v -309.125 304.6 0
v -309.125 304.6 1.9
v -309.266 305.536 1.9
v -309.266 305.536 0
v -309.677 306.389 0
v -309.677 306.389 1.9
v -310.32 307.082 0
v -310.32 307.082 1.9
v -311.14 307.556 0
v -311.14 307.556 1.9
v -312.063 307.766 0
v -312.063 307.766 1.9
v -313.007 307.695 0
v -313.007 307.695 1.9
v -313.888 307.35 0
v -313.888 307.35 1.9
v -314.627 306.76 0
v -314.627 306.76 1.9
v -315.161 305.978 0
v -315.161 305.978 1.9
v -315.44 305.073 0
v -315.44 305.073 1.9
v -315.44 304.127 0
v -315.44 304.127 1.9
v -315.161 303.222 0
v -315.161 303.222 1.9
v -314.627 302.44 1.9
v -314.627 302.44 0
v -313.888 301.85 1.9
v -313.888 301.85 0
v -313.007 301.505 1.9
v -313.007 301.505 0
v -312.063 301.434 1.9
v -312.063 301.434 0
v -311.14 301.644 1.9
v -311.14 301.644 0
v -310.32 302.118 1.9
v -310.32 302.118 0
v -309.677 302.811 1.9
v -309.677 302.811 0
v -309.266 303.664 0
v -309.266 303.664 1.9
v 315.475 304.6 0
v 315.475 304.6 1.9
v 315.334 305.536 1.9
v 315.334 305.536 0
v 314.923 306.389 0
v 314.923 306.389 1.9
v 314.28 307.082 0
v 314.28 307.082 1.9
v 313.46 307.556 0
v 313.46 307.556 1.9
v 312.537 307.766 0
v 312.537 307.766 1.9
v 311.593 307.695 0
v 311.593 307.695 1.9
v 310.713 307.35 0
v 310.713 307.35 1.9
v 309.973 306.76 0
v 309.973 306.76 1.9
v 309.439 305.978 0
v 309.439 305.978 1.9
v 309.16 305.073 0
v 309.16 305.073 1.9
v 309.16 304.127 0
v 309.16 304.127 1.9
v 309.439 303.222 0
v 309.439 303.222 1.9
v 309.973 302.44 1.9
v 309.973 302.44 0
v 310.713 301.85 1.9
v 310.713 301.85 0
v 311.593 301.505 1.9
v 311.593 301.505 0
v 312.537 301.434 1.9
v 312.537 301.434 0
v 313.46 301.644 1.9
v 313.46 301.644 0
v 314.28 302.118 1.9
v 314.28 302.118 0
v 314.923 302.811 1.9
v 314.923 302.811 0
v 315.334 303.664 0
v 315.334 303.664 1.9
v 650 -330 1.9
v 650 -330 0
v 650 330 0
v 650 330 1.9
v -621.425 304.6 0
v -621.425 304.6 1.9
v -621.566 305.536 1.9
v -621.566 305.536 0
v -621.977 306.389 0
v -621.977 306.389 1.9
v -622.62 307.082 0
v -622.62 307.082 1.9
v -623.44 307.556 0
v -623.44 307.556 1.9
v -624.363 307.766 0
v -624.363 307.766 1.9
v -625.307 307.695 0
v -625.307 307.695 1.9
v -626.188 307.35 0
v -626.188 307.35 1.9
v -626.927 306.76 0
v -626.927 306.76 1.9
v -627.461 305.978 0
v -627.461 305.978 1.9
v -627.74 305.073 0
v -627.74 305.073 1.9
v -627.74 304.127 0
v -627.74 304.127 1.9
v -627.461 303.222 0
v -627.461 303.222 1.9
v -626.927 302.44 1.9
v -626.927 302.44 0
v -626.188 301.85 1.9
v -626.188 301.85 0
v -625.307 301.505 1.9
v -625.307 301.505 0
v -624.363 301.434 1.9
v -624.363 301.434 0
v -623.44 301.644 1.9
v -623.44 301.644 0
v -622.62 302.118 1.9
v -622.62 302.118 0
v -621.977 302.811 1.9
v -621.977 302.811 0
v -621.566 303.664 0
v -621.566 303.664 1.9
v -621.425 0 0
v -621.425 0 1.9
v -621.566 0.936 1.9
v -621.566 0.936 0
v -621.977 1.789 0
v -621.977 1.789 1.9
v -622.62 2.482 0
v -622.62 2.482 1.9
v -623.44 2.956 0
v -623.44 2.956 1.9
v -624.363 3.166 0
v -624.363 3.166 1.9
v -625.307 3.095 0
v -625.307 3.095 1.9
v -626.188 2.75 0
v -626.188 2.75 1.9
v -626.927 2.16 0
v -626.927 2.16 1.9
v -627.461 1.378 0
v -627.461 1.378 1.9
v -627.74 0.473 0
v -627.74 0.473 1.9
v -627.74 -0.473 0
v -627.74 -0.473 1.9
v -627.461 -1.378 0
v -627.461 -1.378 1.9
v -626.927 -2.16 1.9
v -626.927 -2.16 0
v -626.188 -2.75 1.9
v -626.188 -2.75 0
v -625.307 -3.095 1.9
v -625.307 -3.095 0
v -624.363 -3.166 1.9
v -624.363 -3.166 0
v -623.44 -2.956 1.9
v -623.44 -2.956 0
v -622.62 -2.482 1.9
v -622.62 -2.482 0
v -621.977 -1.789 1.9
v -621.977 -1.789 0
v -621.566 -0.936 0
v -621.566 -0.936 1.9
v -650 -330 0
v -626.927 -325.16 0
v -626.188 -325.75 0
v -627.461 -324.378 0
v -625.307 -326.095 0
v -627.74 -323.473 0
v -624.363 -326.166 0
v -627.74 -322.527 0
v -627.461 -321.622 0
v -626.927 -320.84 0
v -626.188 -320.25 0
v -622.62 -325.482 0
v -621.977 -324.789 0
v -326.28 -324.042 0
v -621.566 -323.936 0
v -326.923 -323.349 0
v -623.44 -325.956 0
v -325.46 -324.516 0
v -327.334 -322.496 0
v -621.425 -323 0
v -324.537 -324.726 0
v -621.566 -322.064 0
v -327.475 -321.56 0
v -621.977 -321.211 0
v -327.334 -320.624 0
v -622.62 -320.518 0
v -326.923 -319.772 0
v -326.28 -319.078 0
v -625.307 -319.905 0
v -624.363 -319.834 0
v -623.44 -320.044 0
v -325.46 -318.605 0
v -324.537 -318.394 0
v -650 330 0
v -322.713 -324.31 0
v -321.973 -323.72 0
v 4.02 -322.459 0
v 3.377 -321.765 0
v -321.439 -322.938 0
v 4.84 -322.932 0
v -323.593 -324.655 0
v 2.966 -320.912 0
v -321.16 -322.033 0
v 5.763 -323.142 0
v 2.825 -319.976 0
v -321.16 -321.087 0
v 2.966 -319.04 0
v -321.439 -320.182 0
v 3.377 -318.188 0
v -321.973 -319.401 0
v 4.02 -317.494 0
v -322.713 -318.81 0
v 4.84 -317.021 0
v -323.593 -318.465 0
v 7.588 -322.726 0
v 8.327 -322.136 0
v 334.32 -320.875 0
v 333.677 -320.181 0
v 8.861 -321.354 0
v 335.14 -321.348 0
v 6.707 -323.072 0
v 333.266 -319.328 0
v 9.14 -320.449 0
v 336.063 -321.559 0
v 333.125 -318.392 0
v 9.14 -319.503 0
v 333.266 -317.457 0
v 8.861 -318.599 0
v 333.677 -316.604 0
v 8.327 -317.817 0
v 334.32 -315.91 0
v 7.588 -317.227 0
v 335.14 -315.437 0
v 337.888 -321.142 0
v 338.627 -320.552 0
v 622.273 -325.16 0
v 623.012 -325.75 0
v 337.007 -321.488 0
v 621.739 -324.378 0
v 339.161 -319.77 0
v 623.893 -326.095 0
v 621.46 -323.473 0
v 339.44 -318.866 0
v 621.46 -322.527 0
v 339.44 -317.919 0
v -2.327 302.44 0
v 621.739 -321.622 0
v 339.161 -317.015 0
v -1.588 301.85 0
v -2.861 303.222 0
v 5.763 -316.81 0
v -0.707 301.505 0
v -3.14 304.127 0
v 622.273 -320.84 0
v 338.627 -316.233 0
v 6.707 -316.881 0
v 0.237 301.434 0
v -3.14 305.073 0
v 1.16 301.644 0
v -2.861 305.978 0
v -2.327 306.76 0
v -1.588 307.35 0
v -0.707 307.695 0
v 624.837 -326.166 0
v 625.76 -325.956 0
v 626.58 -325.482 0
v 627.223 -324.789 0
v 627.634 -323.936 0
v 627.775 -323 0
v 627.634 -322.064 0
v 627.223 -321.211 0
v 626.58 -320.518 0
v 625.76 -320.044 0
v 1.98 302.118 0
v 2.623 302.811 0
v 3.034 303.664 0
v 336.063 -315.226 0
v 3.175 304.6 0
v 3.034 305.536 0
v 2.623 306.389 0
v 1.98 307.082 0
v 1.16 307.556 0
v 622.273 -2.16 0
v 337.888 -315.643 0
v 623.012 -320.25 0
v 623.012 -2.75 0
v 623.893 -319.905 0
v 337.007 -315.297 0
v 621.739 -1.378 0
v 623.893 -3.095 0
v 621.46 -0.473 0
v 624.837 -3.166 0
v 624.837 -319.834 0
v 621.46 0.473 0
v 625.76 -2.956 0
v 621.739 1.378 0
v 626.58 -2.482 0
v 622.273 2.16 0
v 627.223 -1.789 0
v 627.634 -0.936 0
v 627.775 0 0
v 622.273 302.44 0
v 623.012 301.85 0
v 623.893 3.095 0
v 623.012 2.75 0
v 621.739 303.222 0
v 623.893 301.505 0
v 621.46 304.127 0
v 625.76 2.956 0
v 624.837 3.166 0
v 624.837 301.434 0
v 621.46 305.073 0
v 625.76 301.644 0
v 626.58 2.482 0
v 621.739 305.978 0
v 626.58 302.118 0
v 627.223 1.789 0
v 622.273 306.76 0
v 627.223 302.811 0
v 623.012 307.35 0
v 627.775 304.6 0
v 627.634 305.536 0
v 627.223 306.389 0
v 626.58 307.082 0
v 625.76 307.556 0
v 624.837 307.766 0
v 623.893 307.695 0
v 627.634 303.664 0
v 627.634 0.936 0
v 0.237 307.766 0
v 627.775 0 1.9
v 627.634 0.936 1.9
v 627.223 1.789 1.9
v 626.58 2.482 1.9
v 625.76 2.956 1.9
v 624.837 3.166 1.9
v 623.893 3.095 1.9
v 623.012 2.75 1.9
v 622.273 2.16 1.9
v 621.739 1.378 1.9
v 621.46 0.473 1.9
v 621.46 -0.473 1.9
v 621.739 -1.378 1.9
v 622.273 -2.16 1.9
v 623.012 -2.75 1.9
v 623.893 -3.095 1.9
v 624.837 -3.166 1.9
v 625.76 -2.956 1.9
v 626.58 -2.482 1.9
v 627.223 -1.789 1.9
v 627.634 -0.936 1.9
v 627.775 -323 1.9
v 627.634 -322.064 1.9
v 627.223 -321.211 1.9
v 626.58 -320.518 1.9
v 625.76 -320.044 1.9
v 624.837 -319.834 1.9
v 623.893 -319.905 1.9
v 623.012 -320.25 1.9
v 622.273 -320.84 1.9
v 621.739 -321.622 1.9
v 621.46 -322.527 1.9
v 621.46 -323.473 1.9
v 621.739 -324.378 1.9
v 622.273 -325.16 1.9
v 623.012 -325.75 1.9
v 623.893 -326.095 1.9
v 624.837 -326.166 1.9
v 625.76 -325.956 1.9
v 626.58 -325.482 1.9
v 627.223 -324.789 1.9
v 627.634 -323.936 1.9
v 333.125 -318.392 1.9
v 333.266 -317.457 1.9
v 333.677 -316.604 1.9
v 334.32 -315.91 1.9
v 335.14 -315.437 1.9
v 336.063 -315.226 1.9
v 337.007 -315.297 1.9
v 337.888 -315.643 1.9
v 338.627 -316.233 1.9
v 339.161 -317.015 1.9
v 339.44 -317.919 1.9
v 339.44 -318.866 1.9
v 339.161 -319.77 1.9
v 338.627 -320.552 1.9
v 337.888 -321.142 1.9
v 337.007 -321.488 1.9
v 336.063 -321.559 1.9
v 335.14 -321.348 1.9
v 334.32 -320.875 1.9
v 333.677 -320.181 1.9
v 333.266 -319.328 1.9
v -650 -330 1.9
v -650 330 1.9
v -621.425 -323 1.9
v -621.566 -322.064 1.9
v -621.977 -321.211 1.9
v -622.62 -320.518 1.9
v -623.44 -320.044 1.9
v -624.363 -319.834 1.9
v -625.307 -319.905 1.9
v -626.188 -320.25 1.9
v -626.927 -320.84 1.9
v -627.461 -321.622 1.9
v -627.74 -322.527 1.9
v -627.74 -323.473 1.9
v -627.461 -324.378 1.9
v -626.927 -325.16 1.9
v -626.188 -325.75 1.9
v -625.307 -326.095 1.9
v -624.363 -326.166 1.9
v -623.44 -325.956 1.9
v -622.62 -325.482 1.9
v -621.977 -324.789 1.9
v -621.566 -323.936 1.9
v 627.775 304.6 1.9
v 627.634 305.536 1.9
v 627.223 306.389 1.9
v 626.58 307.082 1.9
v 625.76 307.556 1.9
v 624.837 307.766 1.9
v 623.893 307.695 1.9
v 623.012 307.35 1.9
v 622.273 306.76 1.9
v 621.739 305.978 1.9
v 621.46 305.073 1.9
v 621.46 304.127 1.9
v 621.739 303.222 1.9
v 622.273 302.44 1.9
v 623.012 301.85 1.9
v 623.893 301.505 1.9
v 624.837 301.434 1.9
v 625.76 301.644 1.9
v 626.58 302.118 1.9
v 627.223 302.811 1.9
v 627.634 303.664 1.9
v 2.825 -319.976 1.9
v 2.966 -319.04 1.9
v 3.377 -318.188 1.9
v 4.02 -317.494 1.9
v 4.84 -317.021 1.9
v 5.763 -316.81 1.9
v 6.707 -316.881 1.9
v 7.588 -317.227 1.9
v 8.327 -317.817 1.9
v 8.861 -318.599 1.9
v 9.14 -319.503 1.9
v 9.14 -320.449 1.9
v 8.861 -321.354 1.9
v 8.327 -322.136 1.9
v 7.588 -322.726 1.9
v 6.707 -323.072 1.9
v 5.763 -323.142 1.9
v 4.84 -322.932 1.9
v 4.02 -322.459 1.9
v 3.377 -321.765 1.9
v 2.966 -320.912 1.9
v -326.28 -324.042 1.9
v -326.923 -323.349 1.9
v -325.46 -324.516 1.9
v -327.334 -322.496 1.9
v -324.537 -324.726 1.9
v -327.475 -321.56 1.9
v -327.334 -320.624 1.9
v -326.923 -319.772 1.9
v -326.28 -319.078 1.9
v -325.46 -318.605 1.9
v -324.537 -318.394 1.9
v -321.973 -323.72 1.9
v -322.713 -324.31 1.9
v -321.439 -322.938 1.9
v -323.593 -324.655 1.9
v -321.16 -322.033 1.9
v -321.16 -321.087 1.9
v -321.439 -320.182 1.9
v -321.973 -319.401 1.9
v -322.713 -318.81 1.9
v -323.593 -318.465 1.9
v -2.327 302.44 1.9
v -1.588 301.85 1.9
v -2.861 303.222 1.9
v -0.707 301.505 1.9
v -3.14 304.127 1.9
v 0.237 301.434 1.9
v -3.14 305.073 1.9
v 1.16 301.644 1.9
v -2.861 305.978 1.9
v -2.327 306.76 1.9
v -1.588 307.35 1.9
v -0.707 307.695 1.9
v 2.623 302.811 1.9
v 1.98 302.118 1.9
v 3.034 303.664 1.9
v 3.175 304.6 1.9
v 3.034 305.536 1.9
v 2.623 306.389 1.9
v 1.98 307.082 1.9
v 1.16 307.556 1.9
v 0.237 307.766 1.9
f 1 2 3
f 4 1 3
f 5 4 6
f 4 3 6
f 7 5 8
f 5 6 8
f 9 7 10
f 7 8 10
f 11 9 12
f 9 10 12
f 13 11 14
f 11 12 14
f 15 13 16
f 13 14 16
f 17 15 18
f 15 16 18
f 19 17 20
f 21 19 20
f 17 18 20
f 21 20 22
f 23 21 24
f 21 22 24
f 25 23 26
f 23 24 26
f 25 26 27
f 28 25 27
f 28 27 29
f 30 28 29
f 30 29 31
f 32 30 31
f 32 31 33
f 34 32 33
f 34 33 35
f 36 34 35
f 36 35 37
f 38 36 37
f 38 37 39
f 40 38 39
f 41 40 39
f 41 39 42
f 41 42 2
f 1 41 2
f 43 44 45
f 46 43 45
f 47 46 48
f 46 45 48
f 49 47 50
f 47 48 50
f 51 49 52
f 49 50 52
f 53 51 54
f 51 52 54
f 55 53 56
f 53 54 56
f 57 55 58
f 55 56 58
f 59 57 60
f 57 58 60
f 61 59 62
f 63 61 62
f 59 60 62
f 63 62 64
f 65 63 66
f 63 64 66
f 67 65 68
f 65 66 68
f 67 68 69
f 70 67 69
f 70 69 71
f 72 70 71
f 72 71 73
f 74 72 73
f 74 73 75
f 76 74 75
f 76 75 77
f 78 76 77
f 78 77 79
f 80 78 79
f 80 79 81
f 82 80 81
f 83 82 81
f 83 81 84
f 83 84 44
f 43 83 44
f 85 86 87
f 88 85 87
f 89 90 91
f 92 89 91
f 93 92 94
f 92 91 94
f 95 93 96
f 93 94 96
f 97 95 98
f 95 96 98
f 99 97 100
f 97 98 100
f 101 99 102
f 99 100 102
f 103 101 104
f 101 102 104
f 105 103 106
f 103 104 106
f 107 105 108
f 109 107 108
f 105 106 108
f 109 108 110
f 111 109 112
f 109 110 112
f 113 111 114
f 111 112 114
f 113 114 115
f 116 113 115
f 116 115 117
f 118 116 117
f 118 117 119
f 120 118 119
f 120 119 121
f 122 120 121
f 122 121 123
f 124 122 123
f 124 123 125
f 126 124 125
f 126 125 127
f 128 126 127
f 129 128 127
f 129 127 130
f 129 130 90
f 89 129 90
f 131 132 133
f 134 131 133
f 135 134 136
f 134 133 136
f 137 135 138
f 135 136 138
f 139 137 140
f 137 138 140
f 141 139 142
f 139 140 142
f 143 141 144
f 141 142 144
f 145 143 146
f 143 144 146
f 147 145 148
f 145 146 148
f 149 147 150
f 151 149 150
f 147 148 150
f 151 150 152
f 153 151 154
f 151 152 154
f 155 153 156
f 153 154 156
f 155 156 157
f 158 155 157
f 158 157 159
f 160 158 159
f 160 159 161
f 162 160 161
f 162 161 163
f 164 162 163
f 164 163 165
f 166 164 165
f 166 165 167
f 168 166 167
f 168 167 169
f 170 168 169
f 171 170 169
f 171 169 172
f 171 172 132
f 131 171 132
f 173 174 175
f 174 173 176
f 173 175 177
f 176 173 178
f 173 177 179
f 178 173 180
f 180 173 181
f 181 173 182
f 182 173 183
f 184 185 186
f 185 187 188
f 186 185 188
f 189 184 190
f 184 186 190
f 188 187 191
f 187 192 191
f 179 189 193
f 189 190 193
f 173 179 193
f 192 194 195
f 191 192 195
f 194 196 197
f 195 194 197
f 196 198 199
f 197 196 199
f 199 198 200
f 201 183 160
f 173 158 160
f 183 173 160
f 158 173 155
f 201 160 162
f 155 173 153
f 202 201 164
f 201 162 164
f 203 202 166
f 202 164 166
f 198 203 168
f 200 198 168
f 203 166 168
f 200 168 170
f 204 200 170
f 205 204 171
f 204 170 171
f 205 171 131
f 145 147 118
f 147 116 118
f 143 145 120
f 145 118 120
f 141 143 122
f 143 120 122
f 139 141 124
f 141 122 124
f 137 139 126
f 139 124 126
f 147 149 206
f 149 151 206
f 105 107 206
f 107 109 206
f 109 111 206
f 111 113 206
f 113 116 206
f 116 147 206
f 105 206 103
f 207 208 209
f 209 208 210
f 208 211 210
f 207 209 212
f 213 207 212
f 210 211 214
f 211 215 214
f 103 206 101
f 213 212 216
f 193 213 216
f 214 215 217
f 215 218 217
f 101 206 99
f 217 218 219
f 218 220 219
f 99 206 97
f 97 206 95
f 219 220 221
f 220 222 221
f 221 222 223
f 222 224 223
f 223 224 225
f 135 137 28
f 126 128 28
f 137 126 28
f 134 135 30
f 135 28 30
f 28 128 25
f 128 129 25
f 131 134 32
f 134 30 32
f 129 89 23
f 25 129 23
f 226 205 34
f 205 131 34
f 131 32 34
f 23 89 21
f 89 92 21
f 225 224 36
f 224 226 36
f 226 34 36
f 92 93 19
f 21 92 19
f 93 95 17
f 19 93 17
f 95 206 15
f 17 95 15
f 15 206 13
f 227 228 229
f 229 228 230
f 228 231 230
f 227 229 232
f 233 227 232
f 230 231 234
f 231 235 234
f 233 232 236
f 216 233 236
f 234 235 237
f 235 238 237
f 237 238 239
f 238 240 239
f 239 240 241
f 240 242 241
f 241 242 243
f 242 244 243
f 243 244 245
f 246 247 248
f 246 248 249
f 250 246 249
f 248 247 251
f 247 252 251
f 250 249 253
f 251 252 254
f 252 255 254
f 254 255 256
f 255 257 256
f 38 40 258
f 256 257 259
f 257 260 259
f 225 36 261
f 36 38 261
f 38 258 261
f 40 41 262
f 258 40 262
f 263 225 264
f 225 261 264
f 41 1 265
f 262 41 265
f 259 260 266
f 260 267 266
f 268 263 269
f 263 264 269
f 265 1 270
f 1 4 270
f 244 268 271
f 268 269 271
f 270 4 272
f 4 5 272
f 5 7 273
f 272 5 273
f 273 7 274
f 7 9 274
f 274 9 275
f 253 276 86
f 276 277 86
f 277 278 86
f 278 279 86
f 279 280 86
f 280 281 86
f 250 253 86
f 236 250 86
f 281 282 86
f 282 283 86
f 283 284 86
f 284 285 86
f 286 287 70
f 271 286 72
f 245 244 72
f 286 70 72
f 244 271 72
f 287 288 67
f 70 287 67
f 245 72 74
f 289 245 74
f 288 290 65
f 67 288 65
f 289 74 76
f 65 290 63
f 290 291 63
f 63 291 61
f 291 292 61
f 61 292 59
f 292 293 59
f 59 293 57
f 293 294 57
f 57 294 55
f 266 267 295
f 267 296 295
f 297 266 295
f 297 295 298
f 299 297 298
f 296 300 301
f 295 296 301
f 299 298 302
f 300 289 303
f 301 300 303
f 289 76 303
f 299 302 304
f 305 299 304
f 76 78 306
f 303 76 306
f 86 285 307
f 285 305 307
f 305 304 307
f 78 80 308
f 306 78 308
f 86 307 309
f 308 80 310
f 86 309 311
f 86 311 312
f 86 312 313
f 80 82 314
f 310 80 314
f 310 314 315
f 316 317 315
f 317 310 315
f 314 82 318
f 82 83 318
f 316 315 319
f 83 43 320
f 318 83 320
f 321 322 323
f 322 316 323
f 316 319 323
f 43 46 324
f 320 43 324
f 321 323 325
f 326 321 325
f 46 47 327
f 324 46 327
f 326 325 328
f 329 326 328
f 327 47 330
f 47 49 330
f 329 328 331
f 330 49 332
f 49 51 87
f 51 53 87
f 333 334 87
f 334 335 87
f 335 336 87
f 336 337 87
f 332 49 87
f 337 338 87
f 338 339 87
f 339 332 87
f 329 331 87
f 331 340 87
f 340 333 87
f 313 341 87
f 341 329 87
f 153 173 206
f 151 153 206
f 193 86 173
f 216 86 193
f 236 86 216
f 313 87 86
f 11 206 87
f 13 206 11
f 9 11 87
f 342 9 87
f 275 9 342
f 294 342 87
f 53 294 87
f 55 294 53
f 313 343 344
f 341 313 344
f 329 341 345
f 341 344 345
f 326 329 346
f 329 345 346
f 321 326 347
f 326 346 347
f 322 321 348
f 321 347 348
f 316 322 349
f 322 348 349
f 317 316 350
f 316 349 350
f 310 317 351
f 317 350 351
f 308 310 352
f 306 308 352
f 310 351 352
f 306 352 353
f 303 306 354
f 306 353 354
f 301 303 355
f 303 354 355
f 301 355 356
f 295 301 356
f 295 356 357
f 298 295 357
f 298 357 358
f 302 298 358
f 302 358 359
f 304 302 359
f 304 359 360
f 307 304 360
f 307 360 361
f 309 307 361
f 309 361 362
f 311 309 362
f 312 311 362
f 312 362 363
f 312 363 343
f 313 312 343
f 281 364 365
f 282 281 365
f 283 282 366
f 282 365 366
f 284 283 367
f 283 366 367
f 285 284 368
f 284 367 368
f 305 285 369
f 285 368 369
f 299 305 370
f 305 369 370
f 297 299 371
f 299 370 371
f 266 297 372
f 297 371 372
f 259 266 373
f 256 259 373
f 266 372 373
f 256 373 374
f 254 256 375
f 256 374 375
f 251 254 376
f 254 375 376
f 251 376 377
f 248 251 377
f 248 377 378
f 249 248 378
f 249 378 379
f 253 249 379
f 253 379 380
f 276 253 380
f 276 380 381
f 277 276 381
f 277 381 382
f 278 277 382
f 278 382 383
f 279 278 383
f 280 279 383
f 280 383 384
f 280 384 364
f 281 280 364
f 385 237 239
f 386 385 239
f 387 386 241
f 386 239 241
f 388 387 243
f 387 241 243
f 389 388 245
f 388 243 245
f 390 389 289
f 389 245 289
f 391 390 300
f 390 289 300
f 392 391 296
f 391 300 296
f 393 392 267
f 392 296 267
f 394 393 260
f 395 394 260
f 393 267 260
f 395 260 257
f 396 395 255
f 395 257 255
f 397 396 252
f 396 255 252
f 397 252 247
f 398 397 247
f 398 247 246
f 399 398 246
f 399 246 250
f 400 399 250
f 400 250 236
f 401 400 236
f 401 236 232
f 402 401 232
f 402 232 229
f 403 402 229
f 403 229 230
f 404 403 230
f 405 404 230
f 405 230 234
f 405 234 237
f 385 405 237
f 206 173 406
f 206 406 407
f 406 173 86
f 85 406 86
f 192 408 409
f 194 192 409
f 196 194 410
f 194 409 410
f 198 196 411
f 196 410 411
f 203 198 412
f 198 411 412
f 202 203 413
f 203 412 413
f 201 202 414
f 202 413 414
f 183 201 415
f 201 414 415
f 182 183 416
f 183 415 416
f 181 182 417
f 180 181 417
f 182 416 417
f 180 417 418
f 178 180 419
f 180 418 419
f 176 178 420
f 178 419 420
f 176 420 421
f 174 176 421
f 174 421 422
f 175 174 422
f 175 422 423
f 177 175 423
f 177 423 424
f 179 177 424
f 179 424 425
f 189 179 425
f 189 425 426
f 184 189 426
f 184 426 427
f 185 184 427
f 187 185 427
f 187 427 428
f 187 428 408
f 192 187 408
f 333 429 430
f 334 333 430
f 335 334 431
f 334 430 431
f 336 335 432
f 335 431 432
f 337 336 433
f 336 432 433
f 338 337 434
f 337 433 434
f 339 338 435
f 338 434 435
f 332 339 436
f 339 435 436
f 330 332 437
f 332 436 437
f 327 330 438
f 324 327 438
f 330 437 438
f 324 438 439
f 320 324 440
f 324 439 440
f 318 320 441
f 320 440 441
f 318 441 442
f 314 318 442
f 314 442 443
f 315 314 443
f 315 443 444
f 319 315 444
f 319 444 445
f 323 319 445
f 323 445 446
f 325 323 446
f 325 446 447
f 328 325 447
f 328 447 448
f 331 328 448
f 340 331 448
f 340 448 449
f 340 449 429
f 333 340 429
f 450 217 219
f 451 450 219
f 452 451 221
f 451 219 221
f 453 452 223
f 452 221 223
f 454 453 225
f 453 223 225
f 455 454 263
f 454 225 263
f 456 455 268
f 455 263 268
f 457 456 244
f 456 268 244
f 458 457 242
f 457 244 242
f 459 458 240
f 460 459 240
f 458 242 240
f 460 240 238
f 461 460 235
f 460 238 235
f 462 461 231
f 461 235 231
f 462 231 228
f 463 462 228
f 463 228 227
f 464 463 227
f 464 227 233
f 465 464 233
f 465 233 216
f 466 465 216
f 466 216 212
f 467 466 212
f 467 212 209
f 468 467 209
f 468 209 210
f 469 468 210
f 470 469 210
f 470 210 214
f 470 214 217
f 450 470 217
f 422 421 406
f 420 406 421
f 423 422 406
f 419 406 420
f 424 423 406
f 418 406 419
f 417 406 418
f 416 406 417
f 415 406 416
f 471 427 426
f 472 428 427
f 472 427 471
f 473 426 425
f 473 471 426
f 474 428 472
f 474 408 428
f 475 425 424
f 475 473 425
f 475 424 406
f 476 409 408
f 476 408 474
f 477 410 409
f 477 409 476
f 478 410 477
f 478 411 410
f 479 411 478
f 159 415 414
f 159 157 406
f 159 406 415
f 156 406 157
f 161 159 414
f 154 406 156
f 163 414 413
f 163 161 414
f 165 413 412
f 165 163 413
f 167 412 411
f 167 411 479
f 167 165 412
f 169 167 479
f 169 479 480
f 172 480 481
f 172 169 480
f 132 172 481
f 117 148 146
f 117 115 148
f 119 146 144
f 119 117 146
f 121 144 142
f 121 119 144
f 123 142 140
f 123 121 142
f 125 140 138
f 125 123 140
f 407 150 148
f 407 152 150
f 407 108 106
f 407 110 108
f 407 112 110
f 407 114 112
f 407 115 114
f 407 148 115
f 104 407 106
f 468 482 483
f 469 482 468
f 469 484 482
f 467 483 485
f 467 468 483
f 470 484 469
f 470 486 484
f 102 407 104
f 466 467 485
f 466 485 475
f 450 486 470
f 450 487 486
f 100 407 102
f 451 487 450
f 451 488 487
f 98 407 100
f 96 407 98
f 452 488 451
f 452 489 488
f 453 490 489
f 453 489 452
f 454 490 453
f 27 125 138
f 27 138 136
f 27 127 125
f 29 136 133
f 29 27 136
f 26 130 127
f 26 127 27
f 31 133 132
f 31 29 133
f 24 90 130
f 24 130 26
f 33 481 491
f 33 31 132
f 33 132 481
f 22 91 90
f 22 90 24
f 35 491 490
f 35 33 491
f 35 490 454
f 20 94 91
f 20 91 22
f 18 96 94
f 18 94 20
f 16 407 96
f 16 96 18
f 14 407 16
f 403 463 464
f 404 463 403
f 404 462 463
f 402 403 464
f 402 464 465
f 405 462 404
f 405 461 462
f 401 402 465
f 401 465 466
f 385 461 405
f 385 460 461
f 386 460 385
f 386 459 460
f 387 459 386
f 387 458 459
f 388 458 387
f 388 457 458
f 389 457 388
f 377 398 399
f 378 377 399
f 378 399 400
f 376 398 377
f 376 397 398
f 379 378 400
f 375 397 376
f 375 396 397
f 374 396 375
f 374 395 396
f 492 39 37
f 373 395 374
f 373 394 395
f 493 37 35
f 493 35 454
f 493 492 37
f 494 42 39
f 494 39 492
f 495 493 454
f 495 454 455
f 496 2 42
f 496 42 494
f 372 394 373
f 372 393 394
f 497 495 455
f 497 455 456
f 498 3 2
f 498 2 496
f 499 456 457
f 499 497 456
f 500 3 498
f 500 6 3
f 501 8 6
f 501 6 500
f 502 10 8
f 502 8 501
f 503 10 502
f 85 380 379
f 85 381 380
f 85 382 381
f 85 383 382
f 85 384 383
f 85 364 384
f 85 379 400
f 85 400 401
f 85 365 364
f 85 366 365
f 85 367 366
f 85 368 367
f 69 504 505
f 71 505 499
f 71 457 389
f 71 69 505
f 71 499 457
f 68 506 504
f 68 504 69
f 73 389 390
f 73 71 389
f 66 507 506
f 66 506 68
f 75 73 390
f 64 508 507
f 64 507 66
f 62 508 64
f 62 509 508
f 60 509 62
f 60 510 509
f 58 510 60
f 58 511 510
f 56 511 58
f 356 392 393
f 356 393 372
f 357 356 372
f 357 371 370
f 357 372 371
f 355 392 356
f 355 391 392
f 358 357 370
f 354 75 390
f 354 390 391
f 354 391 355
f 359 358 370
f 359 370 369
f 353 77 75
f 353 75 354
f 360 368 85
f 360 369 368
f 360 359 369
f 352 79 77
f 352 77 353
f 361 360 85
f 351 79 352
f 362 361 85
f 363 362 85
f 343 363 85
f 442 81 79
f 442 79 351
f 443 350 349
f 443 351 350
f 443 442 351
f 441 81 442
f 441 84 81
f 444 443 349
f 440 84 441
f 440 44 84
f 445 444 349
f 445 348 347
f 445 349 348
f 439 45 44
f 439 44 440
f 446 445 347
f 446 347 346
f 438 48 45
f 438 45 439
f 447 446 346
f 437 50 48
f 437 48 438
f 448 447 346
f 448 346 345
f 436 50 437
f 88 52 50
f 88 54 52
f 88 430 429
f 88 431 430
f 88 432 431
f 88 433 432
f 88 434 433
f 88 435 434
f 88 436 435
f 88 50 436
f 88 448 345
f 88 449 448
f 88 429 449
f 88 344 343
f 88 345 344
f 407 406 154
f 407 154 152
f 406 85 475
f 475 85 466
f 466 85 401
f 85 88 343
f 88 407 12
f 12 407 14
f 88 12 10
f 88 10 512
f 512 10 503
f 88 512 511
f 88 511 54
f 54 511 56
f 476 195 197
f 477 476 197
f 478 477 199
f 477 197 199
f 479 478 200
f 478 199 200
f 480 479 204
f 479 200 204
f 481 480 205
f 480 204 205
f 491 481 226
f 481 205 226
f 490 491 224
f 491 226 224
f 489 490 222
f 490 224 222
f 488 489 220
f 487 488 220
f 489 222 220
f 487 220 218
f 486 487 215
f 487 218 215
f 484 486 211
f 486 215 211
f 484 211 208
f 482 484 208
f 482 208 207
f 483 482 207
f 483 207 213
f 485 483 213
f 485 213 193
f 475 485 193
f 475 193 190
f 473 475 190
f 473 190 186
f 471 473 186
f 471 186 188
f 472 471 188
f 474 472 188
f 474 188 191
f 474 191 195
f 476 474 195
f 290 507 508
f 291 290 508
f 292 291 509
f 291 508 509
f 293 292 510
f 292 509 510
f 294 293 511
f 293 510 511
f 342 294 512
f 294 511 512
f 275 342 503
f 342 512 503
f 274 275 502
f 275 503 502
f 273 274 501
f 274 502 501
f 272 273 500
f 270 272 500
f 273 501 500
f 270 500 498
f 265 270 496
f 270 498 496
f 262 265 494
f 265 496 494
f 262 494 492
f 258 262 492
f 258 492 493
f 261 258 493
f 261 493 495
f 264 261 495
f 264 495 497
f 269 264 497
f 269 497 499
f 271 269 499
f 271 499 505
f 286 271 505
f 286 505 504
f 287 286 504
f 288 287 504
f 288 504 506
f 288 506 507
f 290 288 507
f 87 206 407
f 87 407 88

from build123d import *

# Parameters (mm, degrees)
CROQUIS1_W              = 1300
CROQUIS1_H              = 660
SALIENTE_EXTRUIR1_DEPTH = 1.9
CROQUIS2_R              = 3.175
CORTAR_EXTRUIR2_DEPTH   = 6.35
CROQUIS4_R              = 3.175
CORTAR_EXTRUIR3_DEPTH   = 10


with BuildPart() as part:
    # Croquis1 → Saliente-Extruir1 (new body)
    with BuildSketch(Plane.XY):
        Rectangle(CROQUIS1_W, CROQUIS1_H)
    extrude(amount=SALIENTE_EXTRUIR1_DEPTH)

    # Croquis2 → Cortar-Extruir2 (cut)
    with BuildSketch(Plane.XY.offset(1.9)):
        with Locations((-624.6, 304.6)):
            Circle(CROQUIS2_R)
        with Locations((0, 304.6)):
            Circle(CROQUIS2_R)
        with Locations((624.6, 304.6)):
            Circle(CROQUIS2_R)
        with Locations((-312.3, 304.6)):
            Circle(CROQUIS2_R)
        with Locations((312.3, 304.6)):
            Circle(CROQUIS2_R)
        with Locations((-624.6, 0)):
            Circle(CROQUIS2_R)
        with Locations((624.6, 0)):
            Circle(CROQUIS2_R)
        with Locations((-624.6, -323)):
            Circle(CROQUIS2_R)
        with Locations((624.6, -323)):
            Circle(CROQUIS2_R)
    extrude(amount=-CORTAR_EXTRUIR2_DEPTH, mode=Mode.SUBTRACT)

    # Croquis4 → Cortar-Extruir3 (cut)
    with BuildSketch(Plane(origin=(0, 0, 0), x_dir=(-1, 0, 0), z_dir=(0, 0, -1))):
        with Locations((324.3, -321.56006501)):
            Circle(CROQUIS4_R)
        with Locations((-6, -319.97628037)):
            Circle(CROQUIS4_R)
        with Locations((-336.3, -318.392495731)):
            Circle(CROQUIS4_R)
    extrude(amount=-CORTAR_EXTRUIR3_DEPTH, mode=Mode.SUBTRACT)


solid = part.part
